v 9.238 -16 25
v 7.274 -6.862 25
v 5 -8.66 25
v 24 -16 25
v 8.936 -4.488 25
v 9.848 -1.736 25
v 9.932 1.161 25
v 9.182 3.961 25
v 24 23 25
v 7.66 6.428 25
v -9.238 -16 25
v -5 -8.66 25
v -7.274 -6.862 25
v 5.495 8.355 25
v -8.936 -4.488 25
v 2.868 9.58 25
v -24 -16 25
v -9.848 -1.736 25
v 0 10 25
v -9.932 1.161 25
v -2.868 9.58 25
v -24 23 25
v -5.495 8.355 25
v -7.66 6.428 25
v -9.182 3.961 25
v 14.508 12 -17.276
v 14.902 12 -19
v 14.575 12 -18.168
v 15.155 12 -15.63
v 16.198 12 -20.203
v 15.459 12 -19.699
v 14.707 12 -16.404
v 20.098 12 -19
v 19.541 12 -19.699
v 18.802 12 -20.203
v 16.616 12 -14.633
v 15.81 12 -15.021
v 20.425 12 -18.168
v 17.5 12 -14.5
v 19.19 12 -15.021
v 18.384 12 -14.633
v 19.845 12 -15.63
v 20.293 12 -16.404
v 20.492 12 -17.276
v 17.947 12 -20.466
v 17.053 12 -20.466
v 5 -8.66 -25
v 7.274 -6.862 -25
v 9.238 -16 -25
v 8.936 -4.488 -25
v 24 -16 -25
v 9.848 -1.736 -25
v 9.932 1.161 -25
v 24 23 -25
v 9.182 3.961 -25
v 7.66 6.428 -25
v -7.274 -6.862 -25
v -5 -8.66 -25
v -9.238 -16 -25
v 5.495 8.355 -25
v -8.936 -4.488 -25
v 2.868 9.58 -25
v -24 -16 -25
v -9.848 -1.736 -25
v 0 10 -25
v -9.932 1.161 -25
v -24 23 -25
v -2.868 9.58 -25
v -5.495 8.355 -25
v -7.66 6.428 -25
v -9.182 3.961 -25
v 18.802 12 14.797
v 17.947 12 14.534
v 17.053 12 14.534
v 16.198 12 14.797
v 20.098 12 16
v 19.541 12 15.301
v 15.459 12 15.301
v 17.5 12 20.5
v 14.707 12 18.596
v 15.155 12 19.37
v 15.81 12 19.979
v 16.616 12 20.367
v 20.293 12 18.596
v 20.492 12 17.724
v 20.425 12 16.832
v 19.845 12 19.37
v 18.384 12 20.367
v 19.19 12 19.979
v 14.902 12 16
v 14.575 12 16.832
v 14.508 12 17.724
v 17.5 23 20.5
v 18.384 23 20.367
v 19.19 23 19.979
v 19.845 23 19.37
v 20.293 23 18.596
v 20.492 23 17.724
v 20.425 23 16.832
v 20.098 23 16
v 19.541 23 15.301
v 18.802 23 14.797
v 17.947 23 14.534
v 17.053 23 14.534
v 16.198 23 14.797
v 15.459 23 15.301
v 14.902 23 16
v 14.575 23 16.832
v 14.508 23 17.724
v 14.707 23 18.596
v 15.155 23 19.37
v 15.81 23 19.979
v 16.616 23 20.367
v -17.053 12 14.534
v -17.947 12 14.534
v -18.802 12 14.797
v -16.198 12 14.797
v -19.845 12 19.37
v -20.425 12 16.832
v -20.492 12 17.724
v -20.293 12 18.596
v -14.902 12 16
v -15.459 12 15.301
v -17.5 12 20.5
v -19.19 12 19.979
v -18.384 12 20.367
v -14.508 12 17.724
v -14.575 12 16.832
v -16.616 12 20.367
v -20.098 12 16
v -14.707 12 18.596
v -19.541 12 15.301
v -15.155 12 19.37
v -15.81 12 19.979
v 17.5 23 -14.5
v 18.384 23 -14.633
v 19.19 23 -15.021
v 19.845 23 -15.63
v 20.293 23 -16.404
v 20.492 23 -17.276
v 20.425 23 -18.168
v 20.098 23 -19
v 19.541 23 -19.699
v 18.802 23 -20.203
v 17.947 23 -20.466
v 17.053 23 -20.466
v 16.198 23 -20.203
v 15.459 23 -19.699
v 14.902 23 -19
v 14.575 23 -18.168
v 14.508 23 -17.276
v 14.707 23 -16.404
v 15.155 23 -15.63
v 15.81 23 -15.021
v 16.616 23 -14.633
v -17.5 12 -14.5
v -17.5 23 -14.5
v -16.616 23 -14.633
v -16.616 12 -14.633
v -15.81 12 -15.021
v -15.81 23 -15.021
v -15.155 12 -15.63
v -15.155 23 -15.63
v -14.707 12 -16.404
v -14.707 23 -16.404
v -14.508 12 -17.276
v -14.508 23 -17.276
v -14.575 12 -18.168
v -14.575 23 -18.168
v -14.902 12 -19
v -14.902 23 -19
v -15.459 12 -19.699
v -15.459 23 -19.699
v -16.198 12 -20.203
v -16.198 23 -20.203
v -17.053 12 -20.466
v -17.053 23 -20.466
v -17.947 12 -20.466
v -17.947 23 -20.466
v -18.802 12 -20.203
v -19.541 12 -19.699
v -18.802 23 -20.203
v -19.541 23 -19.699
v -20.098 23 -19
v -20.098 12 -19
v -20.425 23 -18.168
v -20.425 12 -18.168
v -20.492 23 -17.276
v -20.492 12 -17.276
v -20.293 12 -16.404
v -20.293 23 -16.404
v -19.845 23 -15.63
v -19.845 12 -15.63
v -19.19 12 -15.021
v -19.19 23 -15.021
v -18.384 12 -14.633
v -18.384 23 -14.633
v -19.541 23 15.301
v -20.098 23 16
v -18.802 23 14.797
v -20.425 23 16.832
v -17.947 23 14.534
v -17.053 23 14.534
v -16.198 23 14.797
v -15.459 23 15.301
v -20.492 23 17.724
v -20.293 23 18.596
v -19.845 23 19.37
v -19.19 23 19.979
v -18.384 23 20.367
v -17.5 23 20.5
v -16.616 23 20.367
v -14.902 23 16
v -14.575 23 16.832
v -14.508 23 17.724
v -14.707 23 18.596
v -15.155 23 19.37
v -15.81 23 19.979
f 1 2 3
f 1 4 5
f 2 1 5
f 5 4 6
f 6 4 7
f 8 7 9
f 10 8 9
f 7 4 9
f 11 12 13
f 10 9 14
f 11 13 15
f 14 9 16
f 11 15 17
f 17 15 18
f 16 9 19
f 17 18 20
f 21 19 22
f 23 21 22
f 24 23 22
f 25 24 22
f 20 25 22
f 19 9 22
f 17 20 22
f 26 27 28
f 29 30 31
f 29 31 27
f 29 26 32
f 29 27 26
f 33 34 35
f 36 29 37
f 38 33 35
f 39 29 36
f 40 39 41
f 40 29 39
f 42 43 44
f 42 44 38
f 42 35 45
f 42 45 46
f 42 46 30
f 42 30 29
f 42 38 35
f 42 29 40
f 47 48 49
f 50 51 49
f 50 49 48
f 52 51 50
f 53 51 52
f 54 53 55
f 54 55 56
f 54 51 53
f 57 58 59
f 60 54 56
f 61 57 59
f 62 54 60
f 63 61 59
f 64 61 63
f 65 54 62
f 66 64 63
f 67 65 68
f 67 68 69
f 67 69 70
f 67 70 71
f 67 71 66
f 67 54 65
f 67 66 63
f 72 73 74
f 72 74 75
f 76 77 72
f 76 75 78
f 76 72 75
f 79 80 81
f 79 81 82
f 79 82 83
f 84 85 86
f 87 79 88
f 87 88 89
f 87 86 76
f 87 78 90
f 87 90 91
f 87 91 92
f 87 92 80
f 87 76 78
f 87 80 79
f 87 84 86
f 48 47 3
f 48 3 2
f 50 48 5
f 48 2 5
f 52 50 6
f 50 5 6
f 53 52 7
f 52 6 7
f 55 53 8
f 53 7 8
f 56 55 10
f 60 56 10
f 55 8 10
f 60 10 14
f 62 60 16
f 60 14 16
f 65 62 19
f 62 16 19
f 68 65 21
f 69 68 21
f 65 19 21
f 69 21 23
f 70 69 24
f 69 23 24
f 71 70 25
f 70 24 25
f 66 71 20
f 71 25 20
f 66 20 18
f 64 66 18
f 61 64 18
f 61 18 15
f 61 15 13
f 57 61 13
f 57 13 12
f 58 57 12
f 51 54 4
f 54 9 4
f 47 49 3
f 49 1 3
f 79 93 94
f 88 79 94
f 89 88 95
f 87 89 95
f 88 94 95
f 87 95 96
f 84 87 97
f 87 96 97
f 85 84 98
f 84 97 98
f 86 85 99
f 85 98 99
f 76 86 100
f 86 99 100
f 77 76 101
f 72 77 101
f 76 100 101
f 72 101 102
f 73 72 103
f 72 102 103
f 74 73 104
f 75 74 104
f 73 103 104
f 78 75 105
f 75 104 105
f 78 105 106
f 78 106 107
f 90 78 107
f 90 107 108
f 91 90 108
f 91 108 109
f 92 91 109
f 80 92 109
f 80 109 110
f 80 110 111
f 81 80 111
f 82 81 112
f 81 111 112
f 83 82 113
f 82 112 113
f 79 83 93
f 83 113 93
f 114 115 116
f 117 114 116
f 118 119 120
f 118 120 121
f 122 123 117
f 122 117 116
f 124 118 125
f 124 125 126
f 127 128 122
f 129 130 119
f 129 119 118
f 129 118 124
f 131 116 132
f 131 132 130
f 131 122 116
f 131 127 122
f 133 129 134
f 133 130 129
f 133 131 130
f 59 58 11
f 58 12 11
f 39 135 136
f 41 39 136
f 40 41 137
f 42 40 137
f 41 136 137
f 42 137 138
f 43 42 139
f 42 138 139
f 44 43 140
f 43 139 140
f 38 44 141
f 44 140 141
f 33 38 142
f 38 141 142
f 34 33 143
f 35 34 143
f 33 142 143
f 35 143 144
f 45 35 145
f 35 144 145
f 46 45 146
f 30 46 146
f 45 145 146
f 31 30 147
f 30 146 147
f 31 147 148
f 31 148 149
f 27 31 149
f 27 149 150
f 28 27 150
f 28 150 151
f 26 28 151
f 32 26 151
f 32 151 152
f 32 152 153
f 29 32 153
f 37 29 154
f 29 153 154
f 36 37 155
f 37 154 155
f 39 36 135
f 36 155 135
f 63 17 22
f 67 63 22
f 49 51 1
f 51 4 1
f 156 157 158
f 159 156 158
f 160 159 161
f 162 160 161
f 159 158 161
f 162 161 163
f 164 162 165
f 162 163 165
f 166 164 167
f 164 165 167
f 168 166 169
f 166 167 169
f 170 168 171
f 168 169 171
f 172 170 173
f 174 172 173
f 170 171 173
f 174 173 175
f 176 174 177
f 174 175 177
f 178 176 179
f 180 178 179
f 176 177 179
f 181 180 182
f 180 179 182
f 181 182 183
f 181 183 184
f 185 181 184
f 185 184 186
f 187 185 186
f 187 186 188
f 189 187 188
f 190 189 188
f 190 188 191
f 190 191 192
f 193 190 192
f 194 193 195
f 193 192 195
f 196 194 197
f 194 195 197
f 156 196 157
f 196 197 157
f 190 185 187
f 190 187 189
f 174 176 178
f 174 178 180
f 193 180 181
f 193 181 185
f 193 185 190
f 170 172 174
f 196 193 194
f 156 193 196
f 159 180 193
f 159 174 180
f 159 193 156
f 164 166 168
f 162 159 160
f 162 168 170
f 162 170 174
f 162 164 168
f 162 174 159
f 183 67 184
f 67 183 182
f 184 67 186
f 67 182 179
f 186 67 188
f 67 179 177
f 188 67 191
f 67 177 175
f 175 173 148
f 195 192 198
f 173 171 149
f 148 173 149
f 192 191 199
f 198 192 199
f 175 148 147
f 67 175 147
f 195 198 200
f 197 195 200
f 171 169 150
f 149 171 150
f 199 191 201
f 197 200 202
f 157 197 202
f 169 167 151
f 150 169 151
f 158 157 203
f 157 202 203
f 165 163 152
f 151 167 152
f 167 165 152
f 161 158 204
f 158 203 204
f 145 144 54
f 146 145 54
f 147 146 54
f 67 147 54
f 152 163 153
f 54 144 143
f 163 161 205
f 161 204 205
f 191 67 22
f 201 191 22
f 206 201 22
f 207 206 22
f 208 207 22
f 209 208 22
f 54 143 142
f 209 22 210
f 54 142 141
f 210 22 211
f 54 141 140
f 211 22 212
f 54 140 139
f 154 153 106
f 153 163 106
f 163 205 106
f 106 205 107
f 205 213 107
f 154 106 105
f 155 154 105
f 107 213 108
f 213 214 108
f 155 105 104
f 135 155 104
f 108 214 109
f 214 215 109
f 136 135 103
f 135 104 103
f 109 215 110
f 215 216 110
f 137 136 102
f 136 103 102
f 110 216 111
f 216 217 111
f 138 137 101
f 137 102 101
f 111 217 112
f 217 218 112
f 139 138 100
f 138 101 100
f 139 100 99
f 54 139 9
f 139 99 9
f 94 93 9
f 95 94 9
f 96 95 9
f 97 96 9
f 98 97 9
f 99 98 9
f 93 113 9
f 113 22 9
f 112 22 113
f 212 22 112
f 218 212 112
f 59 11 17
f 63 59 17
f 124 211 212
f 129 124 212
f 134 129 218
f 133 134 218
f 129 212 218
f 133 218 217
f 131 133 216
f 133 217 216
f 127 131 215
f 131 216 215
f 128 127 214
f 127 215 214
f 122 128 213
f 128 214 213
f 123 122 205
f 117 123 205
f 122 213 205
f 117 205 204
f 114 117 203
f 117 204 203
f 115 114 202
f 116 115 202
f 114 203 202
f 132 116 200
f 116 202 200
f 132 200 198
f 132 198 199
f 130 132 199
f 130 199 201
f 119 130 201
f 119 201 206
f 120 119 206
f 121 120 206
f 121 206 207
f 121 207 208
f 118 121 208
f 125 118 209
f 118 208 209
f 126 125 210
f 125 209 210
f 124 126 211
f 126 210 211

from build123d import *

# Parameters (mm, degrees)
BOSS_EXTRUDE1_DEPTH = 25
SKETCH2_R           = 3
CUT_EXTRUDE1_DEPTH  = 11


with BuildPart() as part:
    # Sketch1 → Boss-Extrude1 (new, symmetric)
    with BuildSketch(Plane.XY):
        with BuildLine():
            Line((-24, 23), (24, 23))
            Line((24, 23), (24, -16))
            Line((24, -16), (9.237604307, -16))
            Line((9.237604307, -16), (5, -8.660254038))
            ThreePointArc((5, -8.660254038), (0, 10), (-5, -8.660254038))
            Line((-5, -8.660254038), (-9.237604307, -16))
            Line((-9.237604307, -16), (-24, -16))
            Line((-24, -16), (-24, 23))
        make_face()
    extrude(amount=BOSS_EXTRUDE1_DEPTH, both=True)

    # Sketch2 → Cut-Extrude1 (cut)
    with BuildSketch(Plane(origin=(0, 23, 0), x_dir=(1, 0, 0), z_dir=(0, 1, 0))):
        with Locations(Location((-17.5, 17.5, 0), (0, 0, 270))):
            Circle(SKETCH2_R)
        with Locations(Location((17.5, 17.5, 0), (0, 0, 270))):
            Circle(SKETCH2_R)
        with Locations(Location((17.5, -17.5, 0), (0, 0, 270))):
            Circle(SKETCH2_R)
        with Locations(Location((-17.5, -17.5, 0), (0, 0, 270))):
            Circle(SKETCH2_R)
    extrude(amount=-CUT_EXTRUDE1_DEPTH, mode=Mode.SUBTRACT)


solid = part.part
